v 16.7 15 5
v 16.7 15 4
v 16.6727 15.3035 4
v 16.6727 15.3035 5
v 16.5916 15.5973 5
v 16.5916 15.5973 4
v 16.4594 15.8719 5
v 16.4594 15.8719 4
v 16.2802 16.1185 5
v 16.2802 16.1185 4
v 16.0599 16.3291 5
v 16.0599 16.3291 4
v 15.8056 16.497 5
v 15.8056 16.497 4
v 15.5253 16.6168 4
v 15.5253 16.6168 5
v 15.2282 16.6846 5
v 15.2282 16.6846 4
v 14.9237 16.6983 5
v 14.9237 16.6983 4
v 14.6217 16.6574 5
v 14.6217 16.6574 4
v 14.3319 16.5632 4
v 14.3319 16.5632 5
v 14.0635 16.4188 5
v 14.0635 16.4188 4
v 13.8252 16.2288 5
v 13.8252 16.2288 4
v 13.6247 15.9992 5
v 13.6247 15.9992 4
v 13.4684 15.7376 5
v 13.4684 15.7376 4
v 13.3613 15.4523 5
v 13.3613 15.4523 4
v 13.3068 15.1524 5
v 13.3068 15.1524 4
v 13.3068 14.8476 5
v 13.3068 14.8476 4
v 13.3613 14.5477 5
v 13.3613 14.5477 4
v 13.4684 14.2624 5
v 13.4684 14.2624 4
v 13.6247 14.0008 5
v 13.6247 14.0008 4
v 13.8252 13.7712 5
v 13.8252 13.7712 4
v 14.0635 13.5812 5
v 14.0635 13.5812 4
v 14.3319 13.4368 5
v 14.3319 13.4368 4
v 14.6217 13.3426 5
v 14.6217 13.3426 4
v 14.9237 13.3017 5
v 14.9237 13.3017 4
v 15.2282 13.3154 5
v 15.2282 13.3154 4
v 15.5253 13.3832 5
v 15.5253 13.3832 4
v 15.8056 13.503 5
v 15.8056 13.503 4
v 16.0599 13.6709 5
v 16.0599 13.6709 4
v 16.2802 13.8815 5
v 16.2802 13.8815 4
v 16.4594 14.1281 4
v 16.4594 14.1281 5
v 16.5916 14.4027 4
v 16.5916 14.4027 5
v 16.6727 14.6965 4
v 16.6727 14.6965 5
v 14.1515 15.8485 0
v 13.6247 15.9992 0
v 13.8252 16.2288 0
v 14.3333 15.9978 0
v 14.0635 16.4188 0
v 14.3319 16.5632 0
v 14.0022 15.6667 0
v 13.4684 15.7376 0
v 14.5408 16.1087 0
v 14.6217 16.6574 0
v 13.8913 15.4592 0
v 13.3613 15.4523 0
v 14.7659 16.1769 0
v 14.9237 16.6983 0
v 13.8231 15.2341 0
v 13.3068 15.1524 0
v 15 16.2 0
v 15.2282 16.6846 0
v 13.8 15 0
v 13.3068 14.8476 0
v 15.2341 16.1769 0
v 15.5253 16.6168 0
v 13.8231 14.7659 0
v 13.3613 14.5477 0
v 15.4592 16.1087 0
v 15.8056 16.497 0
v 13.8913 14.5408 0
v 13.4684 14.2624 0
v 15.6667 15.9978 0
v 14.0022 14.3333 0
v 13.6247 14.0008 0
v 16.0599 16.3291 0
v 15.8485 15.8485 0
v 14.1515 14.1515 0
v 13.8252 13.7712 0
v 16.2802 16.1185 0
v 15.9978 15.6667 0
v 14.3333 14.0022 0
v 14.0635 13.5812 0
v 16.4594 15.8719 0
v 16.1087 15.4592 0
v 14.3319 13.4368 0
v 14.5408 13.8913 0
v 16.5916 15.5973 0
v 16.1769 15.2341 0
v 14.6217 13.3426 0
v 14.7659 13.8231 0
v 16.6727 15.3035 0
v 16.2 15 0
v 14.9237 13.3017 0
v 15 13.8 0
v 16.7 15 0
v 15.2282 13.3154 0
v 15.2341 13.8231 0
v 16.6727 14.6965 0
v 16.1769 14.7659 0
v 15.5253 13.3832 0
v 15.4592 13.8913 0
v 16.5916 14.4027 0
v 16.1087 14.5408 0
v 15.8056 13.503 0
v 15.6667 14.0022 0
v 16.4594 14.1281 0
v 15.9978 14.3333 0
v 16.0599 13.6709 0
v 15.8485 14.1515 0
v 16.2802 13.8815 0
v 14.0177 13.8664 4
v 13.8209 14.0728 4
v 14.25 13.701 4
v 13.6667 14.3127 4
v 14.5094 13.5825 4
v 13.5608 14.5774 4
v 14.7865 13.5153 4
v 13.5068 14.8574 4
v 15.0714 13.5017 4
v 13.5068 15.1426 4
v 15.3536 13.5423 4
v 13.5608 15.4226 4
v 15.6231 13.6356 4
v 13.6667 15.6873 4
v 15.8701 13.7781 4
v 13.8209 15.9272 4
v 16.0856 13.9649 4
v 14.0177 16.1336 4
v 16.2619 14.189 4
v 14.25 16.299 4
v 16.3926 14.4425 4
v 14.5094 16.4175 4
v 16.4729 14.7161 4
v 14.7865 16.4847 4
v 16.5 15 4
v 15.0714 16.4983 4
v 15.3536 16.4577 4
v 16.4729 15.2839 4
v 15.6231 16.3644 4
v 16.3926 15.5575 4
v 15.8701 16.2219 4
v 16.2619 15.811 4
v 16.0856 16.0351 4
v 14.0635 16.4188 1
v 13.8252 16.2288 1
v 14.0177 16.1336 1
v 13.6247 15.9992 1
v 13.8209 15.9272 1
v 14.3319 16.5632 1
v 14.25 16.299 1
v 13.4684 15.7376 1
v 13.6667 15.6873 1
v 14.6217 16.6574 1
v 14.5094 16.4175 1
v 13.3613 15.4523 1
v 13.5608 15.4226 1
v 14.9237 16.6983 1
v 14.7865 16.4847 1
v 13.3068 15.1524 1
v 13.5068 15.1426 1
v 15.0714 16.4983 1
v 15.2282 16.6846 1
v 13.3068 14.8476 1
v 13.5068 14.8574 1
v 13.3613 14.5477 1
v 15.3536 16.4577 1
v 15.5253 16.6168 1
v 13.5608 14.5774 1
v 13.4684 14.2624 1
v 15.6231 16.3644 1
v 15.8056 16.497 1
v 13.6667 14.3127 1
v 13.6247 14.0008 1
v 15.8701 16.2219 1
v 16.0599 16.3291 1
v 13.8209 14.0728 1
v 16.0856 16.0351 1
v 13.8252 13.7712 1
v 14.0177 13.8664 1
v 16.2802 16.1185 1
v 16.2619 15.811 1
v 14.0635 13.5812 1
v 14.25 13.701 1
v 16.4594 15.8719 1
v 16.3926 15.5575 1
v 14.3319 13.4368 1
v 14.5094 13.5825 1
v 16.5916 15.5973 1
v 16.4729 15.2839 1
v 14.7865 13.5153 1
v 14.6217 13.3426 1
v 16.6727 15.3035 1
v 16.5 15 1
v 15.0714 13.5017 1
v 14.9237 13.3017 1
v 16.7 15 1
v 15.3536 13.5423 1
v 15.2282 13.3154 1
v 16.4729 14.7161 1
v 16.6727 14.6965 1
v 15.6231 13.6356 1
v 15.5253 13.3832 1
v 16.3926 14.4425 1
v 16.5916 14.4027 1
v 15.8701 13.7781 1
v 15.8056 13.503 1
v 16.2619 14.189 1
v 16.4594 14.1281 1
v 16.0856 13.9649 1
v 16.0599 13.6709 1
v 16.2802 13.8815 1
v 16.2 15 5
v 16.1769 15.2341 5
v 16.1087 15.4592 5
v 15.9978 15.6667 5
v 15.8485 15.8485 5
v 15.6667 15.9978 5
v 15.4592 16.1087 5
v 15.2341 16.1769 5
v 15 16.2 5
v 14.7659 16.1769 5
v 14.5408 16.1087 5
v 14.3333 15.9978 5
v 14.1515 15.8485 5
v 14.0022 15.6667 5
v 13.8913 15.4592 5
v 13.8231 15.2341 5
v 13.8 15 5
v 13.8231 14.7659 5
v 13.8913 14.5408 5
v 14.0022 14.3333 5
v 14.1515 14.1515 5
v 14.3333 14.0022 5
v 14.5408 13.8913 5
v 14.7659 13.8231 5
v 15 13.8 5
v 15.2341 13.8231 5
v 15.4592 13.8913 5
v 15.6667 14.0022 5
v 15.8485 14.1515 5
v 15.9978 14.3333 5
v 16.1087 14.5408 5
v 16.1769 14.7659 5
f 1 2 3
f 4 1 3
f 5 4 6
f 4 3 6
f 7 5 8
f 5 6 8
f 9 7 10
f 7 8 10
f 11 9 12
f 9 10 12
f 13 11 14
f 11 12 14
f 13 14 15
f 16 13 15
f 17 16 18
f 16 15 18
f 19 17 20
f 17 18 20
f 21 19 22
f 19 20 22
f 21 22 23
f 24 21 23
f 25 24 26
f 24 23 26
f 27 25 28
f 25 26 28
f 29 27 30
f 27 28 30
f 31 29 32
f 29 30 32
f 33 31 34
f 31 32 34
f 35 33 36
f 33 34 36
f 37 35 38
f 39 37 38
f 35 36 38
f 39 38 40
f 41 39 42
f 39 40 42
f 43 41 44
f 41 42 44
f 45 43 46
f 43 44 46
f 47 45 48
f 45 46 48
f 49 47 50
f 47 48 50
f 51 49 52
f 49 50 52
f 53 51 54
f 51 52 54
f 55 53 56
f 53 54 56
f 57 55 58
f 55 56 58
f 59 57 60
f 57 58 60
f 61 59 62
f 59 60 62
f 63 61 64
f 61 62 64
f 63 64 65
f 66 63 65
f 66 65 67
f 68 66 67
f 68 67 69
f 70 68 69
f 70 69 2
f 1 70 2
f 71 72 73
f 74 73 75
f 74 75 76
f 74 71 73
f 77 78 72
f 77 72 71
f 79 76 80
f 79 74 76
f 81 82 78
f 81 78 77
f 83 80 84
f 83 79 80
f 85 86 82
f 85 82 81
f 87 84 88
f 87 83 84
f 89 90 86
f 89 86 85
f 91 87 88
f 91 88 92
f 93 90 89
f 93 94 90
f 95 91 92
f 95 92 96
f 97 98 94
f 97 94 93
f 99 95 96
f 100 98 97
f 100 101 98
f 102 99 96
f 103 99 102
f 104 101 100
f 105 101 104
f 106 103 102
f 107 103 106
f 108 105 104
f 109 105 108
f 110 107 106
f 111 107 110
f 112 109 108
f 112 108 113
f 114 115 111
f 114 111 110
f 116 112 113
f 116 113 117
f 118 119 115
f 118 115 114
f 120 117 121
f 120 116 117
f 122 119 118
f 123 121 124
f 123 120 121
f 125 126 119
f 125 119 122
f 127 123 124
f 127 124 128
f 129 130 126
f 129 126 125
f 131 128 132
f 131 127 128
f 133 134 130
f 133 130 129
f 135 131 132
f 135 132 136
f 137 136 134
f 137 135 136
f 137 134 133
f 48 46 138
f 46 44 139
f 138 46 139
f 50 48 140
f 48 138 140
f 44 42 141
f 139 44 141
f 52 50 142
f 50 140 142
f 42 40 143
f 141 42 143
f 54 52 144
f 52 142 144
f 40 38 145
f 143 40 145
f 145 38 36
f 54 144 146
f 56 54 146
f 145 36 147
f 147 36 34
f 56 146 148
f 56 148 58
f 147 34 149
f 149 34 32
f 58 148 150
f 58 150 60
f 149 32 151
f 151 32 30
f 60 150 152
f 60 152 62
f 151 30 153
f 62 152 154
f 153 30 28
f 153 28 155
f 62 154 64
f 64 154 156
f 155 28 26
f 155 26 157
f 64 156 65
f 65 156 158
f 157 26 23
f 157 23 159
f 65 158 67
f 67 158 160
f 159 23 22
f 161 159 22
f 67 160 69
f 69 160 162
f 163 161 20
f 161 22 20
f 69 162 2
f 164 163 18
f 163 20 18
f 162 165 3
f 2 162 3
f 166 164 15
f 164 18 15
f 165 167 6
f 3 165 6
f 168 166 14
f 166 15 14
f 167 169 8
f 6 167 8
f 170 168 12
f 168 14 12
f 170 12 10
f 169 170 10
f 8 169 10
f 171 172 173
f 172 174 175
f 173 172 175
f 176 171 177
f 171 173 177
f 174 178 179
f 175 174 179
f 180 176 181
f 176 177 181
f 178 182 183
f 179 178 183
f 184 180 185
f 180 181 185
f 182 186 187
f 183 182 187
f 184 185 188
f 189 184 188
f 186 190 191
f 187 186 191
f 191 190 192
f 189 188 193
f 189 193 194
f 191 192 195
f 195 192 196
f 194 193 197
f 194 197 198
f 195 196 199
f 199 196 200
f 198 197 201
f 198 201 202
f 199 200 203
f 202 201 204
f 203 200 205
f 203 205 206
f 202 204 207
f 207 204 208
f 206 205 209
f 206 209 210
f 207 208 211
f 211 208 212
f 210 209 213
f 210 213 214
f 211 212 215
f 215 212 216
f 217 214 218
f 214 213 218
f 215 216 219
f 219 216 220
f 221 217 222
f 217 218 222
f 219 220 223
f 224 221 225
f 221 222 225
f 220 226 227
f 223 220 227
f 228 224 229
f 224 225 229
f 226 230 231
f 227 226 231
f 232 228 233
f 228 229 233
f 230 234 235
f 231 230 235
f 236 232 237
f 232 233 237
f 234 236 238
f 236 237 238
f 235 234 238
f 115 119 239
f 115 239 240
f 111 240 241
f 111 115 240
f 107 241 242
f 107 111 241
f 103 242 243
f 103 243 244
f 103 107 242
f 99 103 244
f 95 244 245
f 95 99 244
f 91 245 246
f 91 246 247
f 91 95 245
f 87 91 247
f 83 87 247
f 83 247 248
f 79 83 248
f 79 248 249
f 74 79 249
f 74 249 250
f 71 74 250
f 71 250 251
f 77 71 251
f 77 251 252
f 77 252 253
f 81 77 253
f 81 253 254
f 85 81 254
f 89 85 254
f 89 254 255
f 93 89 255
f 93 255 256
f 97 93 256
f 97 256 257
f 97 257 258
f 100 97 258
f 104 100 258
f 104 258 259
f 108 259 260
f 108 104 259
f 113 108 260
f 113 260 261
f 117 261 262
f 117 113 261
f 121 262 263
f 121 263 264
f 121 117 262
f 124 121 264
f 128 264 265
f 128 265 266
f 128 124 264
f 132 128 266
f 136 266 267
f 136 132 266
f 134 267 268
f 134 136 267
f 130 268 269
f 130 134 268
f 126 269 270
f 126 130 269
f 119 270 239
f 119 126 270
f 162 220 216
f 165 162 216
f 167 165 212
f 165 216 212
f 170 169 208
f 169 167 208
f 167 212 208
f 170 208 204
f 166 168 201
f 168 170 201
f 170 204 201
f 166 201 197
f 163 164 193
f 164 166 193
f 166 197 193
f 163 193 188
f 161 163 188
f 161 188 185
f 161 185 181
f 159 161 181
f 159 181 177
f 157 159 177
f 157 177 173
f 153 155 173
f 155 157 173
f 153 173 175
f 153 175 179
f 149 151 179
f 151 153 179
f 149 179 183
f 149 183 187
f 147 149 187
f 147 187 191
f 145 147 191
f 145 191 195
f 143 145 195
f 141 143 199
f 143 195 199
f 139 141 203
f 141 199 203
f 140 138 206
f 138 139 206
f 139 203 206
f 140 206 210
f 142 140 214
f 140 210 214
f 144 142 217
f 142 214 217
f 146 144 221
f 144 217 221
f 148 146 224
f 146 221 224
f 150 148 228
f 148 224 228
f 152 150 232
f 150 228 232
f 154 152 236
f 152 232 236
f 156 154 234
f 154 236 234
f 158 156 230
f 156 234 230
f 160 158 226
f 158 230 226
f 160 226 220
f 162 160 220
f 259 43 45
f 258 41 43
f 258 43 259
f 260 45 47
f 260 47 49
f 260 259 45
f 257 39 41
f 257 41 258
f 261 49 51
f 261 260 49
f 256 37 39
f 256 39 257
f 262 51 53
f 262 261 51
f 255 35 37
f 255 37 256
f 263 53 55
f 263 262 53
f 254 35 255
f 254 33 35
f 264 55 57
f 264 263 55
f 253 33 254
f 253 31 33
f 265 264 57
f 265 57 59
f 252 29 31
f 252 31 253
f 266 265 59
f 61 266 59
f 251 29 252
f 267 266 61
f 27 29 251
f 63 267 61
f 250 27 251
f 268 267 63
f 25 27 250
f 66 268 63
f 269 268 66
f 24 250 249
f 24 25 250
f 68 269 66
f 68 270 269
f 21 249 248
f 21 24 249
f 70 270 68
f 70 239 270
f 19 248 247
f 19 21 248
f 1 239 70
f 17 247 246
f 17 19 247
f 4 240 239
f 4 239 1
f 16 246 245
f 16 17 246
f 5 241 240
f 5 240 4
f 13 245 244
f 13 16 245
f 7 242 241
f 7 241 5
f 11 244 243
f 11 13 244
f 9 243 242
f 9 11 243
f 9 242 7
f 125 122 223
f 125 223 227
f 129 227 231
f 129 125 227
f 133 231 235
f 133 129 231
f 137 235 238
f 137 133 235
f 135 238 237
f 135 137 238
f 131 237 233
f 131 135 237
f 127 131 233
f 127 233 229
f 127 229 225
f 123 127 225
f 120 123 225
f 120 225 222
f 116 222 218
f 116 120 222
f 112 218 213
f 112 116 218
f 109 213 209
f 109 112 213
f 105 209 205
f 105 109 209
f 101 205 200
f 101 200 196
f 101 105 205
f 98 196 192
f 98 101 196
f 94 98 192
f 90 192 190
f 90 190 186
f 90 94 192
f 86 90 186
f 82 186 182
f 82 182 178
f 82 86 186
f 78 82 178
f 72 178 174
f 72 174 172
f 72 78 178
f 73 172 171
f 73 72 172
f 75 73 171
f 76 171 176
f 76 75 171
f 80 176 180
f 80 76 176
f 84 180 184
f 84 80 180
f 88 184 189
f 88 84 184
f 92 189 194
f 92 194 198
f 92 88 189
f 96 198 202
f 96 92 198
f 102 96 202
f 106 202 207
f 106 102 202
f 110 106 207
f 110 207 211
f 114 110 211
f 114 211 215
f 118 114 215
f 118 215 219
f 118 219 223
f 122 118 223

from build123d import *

# Parameters (mm, degrees)
SKETCH1_R           = 1.5
SKETCH1_R_2         = 1.2
BOSS_EXTRUDE1_DEPTH = 5
BOSS_EXTRUDE2_START = -1
SKETCH2_R           = 1.7
SKETCH2_R_2         = 1.2
BOSS_EXTRUDE2_DEPTH = 1
SKETCH3_R           = 1.7
SKETCH3_R_2         = 1.2
BOSS_EXTRUDE3_DEPTH = 1


with BuildPart() as part:
    # Sketch1 → Boss-Extrude1 (new body)
    with BuildSketch(Plane.XY):
        with Locations((15, 15)):
            Circle(SKETCH1_R)
        with Locations((15, 15)):
            Circle(SKETCH1_R_2, mode=Mode.SUBTRACT)
    extrude(amount=BOSS_EXTRUDE1_DEPTH)

    # Sketch2 → Boss-Extrude2 (add)
    with BuildSketch(Plane.XY.offset(5).offset(BOSS_EXTRUDE2_START)):
        with Locations((15, 15)):
            Circle(SKETCH2_R)
        with Locations((15, 15)):
            Circle(SKETCH2_R_2, mode=Mode.SUBTRACT)
    extrude(amount=BOSS_EXTRUDE2_DEPTH)

    # Sketch3 → Boss-Extrude3 (add)
    with BuildSketch(Plane(origin=(0, 0, 0), x_dir=(-1, 0, 0), z_dir=(0, 0, -1))):
        with Locations(Location((-15, 15, 0), (0, 0, 180))):
            Circle(SKETCH3_R)
        with Locations(Location((-15, 15, 0), (0, 0, 180))):
            Circle(SKETCH3_R_2, mode=Mode.SUBTRACT)
    extrude(amount=-BOSS_EXTRUDE3_DEPTH)


solid = part.part
